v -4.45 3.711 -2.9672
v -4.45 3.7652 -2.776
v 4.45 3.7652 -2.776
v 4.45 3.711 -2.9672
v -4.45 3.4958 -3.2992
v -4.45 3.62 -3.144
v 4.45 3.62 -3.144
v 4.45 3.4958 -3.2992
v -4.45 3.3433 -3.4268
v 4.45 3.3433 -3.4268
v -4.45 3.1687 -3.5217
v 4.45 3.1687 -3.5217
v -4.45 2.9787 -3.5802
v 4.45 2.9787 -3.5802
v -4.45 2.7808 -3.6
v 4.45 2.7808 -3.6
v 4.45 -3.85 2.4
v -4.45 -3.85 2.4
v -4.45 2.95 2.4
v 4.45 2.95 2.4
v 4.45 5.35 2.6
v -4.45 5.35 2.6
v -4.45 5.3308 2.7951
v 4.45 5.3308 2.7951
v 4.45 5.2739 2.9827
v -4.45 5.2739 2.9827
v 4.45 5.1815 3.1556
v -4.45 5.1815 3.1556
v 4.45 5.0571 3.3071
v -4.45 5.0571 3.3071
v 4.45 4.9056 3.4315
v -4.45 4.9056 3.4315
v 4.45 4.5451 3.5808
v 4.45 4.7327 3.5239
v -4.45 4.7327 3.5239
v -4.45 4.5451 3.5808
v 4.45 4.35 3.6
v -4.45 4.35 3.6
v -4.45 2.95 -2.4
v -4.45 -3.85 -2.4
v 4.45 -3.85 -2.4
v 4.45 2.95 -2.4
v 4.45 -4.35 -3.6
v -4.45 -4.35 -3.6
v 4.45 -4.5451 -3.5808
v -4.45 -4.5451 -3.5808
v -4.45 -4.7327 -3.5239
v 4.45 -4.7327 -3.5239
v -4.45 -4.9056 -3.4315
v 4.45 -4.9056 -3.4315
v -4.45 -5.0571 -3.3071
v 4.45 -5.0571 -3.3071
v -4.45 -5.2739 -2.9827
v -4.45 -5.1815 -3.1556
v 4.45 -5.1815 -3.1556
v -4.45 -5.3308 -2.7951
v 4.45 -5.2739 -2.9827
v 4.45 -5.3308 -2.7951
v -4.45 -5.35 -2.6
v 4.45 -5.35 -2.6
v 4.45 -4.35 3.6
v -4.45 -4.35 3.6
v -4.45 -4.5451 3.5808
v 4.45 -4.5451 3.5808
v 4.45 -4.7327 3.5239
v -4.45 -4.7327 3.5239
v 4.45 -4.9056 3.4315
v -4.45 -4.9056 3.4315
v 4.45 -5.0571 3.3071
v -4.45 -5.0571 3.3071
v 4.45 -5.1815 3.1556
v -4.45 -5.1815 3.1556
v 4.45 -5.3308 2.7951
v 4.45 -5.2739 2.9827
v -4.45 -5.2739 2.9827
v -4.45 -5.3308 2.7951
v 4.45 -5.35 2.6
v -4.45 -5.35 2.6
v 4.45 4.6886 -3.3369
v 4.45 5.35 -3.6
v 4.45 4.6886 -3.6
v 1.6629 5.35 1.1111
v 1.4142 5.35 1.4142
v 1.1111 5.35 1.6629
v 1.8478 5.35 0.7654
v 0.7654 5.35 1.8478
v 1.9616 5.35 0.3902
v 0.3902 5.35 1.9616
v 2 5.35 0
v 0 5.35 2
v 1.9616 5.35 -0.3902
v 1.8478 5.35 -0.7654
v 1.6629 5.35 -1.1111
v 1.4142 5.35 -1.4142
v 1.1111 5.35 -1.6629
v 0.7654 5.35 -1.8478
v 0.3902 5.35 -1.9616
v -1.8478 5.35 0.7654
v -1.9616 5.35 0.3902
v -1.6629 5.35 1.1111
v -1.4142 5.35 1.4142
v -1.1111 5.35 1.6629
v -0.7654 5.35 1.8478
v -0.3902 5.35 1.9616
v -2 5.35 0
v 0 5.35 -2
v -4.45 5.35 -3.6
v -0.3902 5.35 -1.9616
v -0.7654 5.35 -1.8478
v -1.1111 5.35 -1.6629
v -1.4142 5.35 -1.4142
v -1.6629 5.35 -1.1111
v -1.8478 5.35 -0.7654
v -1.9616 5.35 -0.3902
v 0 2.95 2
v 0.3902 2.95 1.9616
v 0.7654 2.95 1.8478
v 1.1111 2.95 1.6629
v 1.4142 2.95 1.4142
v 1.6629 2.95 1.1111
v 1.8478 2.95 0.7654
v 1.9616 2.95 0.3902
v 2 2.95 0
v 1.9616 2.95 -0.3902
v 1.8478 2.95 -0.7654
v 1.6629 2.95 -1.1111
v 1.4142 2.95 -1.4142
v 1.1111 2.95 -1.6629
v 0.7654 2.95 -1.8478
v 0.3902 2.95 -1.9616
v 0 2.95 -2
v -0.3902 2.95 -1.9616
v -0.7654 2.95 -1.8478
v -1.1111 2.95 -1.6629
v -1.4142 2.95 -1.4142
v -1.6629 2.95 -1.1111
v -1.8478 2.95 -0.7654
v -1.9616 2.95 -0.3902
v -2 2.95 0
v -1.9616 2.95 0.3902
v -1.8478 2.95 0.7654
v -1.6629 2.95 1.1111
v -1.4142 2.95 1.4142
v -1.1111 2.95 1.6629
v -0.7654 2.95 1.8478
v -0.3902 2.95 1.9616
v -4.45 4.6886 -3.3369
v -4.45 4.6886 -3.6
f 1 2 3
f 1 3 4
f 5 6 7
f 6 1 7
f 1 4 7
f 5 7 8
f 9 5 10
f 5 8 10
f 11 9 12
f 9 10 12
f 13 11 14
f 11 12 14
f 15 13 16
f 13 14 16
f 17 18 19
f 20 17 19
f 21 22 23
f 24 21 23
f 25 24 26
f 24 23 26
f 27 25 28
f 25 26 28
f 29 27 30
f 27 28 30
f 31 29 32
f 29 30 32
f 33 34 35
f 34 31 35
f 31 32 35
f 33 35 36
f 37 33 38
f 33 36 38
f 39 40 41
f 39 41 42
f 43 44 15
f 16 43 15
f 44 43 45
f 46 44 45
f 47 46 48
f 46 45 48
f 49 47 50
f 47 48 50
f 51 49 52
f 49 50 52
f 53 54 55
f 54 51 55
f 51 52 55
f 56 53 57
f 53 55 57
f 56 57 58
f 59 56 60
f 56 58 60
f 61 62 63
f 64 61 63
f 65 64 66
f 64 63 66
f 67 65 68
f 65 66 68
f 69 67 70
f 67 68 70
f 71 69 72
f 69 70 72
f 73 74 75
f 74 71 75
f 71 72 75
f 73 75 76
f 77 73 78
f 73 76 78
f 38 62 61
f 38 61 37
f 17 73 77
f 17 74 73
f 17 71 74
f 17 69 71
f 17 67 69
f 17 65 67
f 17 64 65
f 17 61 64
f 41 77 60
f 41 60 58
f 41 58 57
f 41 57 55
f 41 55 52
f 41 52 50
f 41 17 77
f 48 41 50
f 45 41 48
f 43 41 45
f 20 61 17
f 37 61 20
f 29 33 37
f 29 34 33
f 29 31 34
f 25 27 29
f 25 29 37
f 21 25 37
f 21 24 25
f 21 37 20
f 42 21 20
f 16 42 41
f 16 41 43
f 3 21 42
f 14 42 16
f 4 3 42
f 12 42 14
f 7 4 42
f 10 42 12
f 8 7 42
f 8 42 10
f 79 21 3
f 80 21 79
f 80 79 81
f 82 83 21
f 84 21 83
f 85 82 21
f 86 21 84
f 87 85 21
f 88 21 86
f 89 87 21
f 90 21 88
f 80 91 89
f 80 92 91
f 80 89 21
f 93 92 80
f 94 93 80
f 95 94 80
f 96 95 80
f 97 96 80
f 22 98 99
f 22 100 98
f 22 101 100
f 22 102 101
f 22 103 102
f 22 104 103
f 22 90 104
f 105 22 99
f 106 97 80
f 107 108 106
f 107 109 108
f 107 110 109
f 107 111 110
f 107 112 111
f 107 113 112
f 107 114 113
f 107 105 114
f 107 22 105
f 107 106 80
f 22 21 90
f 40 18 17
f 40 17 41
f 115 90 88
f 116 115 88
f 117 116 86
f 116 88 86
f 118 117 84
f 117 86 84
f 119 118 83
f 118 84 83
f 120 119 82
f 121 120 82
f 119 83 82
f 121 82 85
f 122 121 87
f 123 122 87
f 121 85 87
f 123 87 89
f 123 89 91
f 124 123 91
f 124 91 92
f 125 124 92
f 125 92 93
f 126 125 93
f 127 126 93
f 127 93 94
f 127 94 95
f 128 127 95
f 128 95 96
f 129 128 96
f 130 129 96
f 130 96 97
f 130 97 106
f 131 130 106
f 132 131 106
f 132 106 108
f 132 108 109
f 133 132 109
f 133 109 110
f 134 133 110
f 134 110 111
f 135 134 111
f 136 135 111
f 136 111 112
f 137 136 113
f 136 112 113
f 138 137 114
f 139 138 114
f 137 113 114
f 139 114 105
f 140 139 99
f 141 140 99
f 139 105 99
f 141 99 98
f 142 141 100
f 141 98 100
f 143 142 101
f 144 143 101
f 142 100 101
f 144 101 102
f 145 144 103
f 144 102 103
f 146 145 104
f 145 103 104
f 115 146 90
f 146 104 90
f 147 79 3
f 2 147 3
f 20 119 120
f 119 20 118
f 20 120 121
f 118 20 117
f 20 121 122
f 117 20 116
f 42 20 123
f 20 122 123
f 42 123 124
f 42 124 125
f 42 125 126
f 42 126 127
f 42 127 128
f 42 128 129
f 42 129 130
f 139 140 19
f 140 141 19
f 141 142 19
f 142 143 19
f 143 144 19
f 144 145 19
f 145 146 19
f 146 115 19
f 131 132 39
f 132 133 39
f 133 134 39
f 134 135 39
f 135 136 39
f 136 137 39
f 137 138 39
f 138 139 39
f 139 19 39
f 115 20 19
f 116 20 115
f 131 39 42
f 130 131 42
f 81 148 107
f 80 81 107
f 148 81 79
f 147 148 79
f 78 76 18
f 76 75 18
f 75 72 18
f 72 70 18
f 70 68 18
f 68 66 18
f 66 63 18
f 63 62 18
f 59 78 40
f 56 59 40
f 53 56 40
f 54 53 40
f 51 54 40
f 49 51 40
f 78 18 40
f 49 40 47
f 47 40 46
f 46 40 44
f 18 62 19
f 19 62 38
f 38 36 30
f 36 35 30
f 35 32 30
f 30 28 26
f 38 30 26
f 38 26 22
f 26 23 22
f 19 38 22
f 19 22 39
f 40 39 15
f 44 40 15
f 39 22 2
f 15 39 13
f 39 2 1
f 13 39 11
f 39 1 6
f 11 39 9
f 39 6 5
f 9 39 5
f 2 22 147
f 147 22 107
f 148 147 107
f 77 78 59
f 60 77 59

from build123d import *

# Parameters (mm, degrees)
EXTRUDE_1_DEPTH      = 4.45
EXTRUDE_1_DEPTH_BACK = 4.45
SKETCH_1_W           = 7.2
SKETCH_1_H           = 10.7
SKETCH_1_W_2         = 4.8
SKETCH_1_H_2         = 6.8
SKETCH_2_R           = 2
CUT_EXTRUDE_1_DEPTH  = 5
CUT_EXTRUDE_2_DEPTH  = 8.9
FILLET_1_R           = 1


with BuildPart() as part:
    # 草图1 → 凸台-拉伸1 (new, two sides: drawn at the far end of the back side and taken through both)
    with BuildSketch(Plane(origin=(0, 0, 0), x_dir=(0, 0, -1), z_dir=(1, 0, 0)).offset(-EXTRUDE_1_DEPTH_BACK)):
        Rectangle(SKETCH_1_W, SKETCH_1_H)
        with Locations((0, -0.45)):
            Rectangle(SKETCH_1_W_2, SKETCH_1_H_2, mode=Mode.SUBTRACT)
    extrude(amount=EXTRUDE_1_DEPTH + EXTRUDE_1_DEPTH_BACK)

    # 草图2 → 切除-拉伸1 (cut)
    with BuildSketch(Plane(origin=(0, 5.35, 0), x_dir=(1, 0, 0), z_dir=(0, 1, 0))):
        with Locations(Location((0, 0, 0), (0, 0, 270))):
            Circle(SKETCH_2_R)
    extrude(amount=-CUT_EXTRUDE_1_DEPTH, mode=Mode.SUBTRACT)

    # 草图3 → 切除-拉伸2 (cut)
    with BuildSketch(Plane(origin=(4.45, 0, 0), x_dir=(0, 0, -1), z_dir=(1, 0, 0))):
        Polygon((3.6, 4.688566818), (3.336866457, 4.688566818), (2.775968401, 3.765242325), (3.6, 3.765242325), align=None)
    extrude(amount=-CUT_EXTRUDE_2_DEPTH, mode=Mode.SUBTRACT)

    # 圆角1
    # the kernel refuses this fillet: 1 mm, written as the material it takes off along each edge
    with BuildSketch(Plane(origin=(6.95, -5.35, -3.6), x_dir=(0, 0, 1), z_dir=(-1, 0, 0))) as fillet_1_piece_1:
        with BuildLine():
            CenterArc((FILLET_1_R, FILLET_1_R), FILLET_1_R, 180, 90)
            Line((0, FILLET_1_R), (-FILLET_1_R * 0.02, FILLET_1_R))
            Line((-FILLET_1_R * 0.02, FILLET_1_R), (-FILLET_1_R * 0.02, -FILLET_1_R * 0.02))
            Line((-FILLET_1_R * 0.02, -FILLET_1_R * 0.02), (FILLET_1_R, -FILLET_1_R * 0.02))
            Line((FILLET_1_R, -FILLET_1_R * 0.02), (FILLET_1_R, 0))
        make_face()
    extrude(amount=13.9, mode=Mode.SUBTRACT)
    with BuildSketch(Plane(origin=(-6.95, -5.35, 3.6), x_dir=(0, 1, 0), z_dir=(1, 0, 0)), Plane(origin=(-6.95, 5.35, 3.6), x_dir=(0, 0, -1), z_dir=(1, 0, 0))) as fillet_1_piece_2:
        with BuildLine():
            CenterArc((FILLET_1_R, -FILLET_1_R), FILLET_1_R, 90, 90)
            Line((0, -FILLET_1_R), (-FILLET_1_R * 0.02, -FILLET_1_R))
            Line((-FILLET_1_R * 0.02, -FILLET_1_R), (-FILLET_1_R * 0.02, FILLET_1_R * 0.02))
            Line((-FILLET_1_R * 0.02, FILLET_1_R * 0.02), (FILLET_1_R, FILLET_1_R * 0.02))
            Line((FILLET_1_R, FILLET_1_R * 0.02), (FILLET_1_R, 0))
        make_face()
    extrude(amount=13.9, mode=Mode.SUBTRACT)
    with BuildSketch(Plane(origin=(6.910989539, 3.765242325, -3.6), x_dir=(0, -1, 0), z_dir=(-1, 0, 0))) as fillet_1_piece_3_section:
        with BuildLine():
            CenterArc((0.984395816, 1), FILLET_1_R, 190.135017985, 79.864982015)
            Line((0, 0.824031599), (-0.019687916, 0.820512231))
            ThreePointArc((-0.019687916, 0.820512231), (-0.02, 0.412015799), (-0.02, 0))
            Line((-0.02, 0), (0, -0.02))
            Line((0, -0.02), (0.984395816, -0.02))
            Line((0.984395816, -0.02), (0.984395816, 0))
        make_face()
    fillet_1_piece_3 = extrude(amount=13.821979078, mode=Mode.PRIVATE)
    fillet_1_piece_3 = split(fillet_1_piece_3, bisect_by=Plane(origin=(0, 3.873370959, -2.84165402), z_dir=(0, -0.5191865527287748, -0.8546609406458278)), keep=Keep.TOP, mode=Mode.PRIVATE)
    add(fillet_1_piece_3, mode=Mode.SUBTRACT)


solid = part.part
